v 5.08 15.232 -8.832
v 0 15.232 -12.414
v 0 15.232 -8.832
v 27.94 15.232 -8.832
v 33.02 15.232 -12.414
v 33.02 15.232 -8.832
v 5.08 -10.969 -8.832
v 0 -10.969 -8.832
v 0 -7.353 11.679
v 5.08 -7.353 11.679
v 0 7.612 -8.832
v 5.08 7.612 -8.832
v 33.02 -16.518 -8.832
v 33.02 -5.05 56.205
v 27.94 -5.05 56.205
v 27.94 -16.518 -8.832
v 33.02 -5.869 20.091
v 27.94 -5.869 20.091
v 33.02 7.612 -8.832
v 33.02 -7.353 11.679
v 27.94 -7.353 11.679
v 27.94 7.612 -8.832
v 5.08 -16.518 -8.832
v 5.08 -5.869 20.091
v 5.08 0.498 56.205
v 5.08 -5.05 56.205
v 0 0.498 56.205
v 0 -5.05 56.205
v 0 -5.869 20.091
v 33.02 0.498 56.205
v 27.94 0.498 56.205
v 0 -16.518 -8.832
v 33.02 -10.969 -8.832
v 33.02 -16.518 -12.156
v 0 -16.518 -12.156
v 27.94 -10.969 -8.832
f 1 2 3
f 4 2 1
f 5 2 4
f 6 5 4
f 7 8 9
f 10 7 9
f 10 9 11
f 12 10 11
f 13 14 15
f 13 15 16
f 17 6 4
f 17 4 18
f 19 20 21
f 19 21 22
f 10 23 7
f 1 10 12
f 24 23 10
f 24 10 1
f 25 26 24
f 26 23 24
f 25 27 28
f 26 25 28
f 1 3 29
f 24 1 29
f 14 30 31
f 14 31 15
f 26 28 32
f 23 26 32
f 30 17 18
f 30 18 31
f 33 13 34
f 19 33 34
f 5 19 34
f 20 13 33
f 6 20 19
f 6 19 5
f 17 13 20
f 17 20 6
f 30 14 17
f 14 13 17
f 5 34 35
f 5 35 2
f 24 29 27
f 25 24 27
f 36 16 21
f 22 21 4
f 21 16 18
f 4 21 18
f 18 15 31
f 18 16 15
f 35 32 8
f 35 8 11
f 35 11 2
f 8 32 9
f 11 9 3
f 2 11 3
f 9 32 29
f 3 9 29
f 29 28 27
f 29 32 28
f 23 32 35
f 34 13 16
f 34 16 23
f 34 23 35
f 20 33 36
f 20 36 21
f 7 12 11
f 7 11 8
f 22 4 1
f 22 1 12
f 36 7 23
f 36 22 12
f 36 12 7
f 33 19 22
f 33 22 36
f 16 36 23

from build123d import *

# Parameters (mm, degrees)
F1_DEPTH = 16.51
F2_DEPTH = 5.08


with BuildPart() as f1:
    # F0 (on Right) → F1 (new body)
    with BuildSketch(Plane.YZ):
        Polygon((-10.969255, -8.832134), (-16.518005, -8.832134), (-16.518005, -12.155996), (15.231995, -12.41384), (15.231995, -8.832134), (7.611995, -8.832134), align=None)
    extrude(amount=F1_DEPTH)

    # F0 (on Right) → F2 (join)
    with BuildSketch(Plane.YZ):
        Polygon((-5.86939, 20.09064), (-7.352562, 11.67915), (7.611995, -8.832134), (15.231995, -8.832134), align=None)
        Polygon((-5.050279, 56.20457), (-16.518005, -8.832134), (-10.969255, -8.832134), (-7.352562, 11.67915), (-5.86939, 20.09064), (0.498471, 56.20457), align=None)
    extrude(amount=F2_DEPTH)

    # F3: F1 across face


with BuildPart() as f1_1:
    add(f1.part)
    add(f1.part.mirror(Plane(origin=(16.51, -0.445421, -10.559328), x_dir=(0, 1, 0), z_dir=(1, 0, 0))))


solid = f1_1.part
